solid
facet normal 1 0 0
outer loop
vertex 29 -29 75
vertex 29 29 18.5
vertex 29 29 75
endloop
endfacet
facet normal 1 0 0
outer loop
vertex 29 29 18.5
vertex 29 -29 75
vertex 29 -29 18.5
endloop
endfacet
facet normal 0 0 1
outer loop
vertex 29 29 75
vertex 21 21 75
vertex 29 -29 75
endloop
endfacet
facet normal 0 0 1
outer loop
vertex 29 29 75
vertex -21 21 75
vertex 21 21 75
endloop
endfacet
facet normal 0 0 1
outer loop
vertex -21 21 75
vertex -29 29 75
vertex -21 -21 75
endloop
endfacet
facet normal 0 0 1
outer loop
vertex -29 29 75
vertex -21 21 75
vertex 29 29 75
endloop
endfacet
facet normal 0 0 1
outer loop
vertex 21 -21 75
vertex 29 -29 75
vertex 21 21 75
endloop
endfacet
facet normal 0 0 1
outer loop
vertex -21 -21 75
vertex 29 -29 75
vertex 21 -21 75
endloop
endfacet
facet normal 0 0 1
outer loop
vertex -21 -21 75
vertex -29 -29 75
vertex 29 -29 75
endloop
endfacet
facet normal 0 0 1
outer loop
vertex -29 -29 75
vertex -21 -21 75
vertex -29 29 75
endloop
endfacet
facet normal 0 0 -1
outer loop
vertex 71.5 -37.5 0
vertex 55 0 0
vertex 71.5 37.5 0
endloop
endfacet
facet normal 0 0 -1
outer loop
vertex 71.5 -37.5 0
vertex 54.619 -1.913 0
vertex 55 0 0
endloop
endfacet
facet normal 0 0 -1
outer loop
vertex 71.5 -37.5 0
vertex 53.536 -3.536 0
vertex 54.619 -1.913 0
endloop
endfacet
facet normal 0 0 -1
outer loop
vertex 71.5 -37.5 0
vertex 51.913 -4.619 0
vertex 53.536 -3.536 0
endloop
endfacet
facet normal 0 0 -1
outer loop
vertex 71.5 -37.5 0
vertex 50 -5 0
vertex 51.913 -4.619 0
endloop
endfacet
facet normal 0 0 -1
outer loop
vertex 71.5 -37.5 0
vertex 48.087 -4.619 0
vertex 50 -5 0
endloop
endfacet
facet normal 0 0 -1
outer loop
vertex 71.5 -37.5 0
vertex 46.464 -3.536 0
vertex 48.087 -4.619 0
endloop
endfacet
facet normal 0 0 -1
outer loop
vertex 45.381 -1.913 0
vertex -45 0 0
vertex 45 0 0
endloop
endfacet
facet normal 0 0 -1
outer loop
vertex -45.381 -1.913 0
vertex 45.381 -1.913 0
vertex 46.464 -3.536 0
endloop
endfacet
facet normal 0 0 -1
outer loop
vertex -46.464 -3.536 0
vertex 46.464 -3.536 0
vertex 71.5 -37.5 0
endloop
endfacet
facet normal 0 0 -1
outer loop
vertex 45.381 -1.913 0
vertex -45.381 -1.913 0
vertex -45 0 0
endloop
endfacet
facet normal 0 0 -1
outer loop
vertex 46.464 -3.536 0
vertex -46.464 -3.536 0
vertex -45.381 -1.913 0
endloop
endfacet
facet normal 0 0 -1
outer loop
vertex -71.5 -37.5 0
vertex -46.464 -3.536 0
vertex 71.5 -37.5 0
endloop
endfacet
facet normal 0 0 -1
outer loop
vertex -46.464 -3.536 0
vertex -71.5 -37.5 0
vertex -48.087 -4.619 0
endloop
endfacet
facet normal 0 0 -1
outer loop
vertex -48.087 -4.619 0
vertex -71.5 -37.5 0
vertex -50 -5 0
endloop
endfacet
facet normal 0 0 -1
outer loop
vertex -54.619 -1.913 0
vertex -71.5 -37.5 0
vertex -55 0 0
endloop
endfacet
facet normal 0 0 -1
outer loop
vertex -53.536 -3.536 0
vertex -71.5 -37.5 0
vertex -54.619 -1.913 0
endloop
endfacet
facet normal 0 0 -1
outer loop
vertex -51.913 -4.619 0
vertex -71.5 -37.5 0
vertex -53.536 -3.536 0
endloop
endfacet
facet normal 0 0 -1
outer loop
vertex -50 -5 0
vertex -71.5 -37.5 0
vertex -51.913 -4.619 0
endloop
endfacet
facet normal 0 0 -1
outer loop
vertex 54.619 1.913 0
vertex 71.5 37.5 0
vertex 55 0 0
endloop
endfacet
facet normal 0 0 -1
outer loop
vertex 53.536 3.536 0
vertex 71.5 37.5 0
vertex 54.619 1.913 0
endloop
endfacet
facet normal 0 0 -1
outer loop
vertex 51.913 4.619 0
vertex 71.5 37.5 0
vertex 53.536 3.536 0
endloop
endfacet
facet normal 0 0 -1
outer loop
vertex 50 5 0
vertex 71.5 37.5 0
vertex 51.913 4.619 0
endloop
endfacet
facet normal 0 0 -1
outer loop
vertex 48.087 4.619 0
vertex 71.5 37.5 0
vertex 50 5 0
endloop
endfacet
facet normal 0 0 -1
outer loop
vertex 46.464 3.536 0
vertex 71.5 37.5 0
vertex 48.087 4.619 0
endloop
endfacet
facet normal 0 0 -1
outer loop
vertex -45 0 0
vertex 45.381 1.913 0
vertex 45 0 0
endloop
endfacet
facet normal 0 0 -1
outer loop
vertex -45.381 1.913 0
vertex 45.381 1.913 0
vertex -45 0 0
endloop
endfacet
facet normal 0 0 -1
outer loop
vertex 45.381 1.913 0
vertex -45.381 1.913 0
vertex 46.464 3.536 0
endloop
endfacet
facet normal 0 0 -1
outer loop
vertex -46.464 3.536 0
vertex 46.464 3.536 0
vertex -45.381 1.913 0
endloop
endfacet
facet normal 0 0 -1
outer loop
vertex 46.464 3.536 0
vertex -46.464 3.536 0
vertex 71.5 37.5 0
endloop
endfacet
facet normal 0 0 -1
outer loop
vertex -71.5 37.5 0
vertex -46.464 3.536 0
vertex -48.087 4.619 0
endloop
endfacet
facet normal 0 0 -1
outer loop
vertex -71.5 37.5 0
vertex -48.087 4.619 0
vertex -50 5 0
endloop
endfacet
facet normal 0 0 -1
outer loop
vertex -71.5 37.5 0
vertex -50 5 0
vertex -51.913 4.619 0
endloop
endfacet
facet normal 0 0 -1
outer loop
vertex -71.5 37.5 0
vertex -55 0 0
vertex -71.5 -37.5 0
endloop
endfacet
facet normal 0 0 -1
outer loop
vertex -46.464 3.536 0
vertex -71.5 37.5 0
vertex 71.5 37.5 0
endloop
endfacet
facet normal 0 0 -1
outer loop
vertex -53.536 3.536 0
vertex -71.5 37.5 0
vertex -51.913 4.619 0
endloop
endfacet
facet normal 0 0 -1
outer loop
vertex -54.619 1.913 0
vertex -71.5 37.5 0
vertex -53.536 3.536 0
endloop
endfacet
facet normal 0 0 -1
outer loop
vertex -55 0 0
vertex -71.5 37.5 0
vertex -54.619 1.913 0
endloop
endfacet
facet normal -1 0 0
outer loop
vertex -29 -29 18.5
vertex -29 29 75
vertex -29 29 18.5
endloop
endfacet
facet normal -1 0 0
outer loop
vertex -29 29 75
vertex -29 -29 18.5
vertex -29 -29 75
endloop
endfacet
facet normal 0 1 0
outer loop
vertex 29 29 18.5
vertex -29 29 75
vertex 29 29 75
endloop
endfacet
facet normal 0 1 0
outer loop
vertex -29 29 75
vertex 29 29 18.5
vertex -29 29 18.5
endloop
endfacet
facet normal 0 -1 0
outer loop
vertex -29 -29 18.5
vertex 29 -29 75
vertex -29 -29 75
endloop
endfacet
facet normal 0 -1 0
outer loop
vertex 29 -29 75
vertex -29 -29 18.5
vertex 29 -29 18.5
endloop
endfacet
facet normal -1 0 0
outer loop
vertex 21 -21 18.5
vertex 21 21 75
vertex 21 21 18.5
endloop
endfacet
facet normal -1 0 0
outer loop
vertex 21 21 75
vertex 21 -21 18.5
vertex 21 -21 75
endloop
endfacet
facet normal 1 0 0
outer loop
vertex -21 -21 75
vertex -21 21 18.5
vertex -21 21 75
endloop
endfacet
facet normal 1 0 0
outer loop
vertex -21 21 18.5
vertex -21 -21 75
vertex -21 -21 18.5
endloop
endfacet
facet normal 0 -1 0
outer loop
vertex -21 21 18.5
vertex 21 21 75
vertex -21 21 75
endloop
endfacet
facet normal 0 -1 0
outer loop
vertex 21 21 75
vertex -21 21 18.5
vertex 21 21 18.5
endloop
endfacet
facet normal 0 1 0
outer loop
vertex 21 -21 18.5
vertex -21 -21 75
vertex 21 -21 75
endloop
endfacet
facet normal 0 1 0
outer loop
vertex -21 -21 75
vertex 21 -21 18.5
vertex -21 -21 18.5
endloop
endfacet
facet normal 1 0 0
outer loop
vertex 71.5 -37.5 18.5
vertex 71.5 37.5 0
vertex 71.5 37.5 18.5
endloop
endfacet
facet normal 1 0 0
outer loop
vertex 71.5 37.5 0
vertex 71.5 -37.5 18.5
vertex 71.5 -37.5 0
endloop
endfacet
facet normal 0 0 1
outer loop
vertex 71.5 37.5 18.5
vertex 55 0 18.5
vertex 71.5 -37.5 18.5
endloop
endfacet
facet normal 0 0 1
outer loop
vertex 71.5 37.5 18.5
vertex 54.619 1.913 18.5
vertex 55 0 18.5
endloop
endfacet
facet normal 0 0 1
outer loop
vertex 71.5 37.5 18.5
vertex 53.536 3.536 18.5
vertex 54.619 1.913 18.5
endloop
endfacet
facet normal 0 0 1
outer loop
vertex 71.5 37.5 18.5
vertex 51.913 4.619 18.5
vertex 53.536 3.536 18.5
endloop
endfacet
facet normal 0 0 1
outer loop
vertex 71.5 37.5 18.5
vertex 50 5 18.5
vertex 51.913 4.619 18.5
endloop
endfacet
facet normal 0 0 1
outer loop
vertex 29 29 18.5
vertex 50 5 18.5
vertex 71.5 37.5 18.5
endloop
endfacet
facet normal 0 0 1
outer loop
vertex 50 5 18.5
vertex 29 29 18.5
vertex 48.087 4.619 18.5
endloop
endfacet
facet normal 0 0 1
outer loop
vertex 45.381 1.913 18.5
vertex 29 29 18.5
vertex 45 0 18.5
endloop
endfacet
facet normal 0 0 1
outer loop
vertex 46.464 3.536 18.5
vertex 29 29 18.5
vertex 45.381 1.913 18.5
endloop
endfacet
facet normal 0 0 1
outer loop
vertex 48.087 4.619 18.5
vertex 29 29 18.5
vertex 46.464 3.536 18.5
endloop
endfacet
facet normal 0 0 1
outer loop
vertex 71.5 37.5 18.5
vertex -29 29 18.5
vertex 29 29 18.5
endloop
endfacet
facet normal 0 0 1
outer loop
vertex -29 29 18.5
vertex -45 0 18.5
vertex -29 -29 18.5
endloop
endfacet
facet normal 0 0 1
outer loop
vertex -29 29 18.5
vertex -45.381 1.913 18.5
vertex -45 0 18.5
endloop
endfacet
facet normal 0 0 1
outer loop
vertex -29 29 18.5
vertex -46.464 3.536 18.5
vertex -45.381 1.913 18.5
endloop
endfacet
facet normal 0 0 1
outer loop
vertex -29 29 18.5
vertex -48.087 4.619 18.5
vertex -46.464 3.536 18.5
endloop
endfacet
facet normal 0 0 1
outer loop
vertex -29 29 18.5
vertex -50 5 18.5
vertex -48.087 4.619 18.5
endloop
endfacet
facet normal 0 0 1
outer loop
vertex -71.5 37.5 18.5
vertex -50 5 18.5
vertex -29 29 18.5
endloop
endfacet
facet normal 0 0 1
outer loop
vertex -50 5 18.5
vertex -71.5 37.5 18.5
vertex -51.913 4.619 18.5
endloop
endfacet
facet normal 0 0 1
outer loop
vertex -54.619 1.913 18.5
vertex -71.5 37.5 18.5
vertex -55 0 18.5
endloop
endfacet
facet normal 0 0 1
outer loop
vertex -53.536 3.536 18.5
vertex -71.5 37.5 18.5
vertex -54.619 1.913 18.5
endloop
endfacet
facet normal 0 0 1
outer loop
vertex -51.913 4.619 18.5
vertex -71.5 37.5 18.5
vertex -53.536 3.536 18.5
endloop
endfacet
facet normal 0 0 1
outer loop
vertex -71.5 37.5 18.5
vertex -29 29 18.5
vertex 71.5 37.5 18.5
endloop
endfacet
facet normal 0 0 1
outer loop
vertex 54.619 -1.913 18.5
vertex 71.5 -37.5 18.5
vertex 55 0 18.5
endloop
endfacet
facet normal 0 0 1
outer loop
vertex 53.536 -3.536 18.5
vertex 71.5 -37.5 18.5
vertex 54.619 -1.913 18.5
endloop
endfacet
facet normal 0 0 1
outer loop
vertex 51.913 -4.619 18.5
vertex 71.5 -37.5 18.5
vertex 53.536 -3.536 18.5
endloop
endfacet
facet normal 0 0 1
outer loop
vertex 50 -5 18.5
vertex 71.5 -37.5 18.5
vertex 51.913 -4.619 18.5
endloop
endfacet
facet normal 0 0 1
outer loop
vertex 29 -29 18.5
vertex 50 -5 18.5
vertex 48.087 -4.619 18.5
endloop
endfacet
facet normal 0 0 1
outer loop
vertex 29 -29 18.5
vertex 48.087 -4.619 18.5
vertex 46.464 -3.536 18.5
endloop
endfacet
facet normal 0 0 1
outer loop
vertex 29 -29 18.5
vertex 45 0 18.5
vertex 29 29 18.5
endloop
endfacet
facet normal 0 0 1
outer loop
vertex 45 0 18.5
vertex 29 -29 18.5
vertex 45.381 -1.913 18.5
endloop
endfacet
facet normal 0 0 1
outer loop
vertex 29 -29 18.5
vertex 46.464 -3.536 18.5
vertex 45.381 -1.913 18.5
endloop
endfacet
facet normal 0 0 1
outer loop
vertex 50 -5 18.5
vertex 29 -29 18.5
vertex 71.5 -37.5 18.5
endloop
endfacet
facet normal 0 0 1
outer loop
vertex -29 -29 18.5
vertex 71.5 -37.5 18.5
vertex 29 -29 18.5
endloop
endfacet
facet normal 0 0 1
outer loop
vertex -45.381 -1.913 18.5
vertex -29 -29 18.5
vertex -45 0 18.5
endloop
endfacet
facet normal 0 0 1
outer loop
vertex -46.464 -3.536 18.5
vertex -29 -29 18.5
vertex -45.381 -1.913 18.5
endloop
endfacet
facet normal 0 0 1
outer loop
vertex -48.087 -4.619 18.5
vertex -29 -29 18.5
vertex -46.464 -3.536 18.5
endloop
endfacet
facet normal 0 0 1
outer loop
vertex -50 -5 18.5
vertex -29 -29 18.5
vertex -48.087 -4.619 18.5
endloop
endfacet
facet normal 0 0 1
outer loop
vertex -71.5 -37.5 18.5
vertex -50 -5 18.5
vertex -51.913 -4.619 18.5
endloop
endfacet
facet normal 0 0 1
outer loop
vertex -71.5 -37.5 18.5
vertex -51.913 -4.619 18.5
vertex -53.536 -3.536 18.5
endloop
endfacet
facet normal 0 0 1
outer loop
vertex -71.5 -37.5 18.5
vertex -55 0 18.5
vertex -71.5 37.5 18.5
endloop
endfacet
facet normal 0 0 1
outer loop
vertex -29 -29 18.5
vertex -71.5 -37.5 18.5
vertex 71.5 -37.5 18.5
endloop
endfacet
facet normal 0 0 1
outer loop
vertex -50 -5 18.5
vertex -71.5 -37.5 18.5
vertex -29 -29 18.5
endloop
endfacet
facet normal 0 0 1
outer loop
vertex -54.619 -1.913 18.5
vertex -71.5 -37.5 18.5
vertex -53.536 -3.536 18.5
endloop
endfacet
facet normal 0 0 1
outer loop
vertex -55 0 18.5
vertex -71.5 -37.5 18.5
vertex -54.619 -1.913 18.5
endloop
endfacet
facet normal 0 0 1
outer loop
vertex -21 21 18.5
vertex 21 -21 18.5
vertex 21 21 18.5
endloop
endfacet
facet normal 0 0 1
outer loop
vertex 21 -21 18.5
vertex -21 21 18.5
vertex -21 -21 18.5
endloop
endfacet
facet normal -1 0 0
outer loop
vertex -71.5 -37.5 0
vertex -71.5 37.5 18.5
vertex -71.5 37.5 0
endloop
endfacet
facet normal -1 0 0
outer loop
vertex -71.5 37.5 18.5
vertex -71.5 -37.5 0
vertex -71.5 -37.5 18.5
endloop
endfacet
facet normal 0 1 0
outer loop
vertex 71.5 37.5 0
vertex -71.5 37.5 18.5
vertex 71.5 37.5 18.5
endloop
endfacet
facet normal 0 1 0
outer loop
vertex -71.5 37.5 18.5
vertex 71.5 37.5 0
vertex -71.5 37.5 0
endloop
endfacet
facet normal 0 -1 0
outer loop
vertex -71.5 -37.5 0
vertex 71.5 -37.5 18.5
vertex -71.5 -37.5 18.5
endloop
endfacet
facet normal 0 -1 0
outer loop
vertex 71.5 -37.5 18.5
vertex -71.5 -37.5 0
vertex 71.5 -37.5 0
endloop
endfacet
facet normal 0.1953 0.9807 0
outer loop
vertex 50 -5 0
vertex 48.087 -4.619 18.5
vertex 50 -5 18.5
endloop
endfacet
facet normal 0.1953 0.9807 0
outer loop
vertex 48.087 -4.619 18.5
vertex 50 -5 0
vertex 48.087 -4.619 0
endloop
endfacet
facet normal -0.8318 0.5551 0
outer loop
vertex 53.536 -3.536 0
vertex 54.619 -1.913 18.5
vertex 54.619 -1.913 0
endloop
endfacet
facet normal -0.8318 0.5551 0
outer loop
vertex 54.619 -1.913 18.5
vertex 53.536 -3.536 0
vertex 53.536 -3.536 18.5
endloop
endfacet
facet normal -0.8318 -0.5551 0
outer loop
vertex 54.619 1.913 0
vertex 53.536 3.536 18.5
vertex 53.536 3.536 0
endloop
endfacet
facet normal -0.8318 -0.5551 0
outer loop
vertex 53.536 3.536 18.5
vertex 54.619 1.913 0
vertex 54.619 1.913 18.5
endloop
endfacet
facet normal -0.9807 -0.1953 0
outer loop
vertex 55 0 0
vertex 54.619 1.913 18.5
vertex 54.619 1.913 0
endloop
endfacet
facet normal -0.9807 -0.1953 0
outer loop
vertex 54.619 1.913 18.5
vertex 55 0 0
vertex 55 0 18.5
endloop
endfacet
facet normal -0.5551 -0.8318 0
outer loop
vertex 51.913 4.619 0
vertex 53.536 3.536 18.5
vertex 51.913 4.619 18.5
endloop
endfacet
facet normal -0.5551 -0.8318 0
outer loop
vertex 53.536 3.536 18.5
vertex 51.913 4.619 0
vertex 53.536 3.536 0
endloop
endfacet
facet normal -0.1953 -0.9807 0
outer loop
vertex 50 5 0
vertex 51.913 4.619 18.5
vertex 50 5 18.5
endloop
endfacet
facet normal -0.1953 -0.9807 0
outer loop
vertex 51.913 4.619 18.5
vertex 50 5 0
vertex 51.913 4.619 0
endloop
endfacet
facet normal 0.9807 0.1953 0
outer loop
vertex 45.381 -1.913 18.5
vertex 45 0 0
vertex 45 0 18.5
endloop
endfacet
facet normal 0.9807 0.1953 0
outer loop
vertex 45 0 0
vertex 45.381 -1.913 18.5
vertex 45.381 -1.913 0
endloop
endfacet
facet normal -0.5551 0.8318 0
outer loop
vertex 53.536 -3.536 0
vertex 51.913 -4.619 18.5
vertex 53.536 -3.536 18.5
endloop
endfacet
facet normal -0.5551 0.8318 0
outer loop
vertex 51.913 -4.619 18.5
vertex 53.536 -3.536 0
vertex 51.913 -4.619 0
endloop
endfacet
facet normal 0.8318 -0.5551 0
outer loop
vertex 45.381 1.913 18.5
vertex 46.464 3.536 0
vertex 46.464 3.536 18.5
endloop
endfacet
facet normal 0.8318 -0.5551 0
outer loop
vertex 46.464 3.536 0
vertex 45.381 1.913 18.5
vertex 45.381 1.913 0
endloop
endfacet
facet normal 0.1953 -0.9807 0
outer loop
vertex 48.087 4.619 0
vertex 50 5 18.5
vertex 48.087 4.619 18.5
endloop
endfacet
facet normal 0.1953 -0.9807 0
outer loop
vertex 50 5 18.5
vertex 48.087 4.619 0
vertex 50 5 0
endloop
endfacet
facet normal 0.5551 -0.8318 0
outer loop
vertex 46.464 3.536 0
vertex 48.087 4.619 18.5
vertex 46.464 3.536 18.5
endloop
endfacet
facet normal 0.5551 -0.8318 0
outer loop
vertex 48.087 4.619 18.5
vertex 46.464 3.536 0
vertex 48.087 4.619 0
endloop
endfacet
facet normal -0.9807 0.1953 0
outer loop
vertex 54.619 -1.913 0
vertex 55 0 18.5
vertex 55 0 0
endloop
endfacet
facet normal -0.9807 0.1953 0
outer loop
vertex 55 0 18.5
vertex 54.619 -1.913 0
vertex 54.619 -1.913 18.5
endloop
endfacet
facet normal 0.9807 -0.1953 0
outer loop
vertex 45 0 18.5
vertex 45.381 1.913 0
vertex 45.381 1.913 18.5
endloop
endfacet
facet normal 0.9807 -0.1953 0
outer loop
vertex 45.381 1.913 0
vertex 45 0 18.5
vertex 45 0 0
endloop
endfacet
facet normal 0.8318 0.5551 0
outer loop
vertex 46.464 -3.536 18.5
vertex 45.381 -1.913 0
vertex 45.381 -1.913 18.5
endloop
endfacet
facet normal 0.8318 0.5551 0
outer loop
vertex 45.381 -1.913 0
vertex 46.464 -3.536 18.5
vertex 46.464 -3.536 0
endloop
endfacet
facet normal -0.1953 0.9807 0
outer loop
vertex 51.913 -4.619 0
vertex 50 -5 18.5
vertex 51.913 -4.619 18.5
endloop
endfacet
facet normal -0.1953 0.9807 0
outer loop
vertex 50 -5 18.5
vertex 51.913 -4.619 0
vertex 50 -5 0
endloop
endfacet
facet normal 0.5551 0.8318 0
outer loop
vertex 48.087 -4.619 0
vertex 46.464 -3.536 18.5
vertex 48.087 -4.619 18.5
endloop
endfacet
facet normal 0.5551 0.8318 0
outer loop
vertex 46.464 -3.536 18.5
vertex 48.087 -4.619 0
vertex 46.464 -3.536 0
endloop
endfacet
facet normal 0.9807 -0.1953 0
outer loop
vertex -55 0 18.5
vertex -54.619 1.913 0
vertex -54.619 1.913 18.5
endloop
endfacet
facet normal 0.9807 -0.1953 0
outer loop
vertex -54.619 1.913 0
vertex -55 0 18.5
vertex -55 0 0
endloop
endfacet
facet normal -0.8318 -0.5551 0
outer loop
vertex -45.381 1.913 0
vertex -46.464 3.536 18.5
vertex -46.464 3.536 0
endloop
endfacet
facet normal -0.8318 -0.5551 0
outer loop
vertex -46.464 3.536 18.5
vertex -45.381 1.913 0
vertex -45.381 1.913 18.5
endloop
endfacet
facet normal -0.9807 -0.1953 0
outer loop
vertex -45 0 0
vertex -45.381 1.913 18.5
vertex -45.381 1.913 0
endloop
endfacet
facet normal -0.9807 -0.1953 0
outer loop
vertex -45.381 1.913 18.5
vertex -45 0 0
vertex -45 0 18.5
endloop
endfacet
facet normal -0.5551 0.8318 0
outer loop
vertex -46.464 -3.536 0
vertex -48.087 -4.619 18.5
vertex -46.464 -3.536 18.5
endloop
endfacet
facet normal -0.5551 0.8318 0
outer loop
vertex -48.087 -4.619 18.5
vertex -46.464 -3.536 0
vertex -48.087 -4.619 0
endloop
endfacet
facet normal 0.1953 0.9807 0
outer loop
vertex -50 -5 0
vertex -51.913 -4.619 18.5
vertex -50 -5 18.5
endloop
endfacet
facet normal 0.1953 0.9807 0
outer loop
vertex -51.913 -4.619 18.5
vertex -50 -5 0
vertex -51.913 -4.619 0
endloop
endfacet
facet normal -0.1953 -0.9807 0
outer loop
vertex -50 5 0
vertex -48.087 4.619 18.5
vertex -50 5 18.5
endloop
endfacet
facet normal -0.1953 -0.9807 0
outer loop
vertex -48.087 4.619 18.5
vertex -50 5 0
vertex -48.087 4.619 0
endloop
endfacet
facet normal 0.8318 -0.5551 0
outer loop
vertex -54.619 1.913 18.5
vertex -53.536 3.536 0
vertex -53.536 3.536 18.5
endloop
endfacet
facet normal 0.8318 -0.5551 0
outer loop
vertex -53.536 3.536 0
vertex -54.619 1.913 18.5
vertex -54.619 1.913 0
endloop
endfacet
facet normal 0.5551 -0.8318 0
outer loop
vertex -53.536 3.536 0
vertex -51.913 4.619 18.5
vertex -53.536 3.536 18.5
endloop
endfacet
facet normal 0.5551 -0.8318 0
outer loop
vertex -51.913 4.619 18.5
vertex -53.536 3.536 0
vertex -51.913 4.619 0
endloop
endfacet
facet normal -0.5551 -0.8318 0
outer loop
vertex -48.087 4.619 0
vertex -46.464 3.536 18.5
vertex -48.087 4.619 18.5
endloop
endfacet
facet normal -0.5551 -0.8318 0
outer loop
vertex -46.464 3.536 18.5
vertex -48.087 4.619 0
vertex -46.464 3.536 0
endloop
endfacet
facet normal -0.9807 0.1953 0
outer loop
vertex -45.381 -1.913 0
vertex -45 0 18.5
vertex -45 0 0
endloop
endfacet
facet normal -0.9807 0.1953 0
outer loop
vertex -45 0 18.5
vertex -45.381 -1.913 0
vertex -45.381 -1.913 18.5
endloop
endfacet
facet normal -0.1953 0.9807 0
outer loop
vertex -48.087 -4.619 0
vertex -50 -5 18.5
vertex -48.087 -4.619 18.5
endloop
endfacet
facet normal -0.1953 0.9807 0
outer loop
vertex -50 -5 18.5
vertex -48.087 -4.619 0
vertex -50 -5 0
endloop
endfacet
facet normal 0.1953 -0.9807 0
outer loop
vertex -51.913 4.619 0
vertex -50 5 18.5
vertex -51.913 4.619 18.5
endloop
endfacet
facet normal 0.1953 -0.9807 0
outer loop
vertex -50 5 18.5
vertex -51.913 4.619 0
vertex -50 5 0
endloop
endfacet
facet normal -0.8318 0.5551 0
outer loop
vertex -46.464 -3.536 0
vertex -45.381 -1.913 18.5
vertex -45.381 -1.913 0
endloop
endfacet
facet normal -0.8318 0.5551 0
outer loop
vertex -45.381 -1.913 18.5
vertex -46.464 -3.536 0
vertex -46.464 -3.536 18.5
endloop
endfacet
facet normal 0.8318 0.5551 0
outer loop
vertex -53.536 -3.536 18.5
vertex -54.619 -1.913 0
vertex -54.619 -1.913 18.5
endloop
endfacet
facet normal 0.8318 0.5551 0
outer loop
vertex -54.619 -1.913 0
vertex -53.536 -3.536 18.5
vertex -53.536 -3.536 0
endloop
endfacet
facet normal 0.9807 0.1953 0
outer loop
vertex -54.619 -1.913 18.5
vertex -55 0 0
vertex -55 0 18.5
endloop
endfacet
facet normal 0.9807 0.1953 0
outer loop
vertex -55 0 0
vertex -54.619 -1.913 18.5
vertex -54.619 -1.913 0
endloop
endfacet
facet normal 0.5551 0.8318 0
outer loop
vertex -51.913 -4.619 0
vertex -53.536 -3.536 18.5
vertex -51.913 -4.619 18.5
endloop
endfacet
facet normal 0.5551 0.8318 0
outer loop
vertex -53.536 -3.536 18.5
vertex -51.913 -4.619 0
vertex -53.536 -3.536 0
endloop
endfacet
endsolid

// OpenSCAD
// file: tube_clamp_round_base_plate_132_functions.scad
function get_L_shaft_with_base_plate_round_base_plate_132(tube_diameter) = 
    (tube_diameter == 27) ? 
        85
    : (tube_diameter == 42) ?
        122
    : 25
;
function get_R_plate_round_base_plate_132(tube_diameter) = 
    (tube_diameter == 27) ? 
        [64, 114, 7]
    : (tube_diameter == 42) ?
        [80, 140, 10]
    : [10, 20, 1]
;
function get_offset_hole_y_round_base_plate_132(tube_diameter) = 
    (tube_diameter == 27) ? 
        38
    : (tube_diameter == 42) ?
        50
    : 10
;
function get_diameter_hole_round_base_plate_132(tube_diameter) = 10;
// file: tube_clamp_round_3_way_through_116_functions.scad
function  get_L_shaft_long_round_3_way_through_116(tube_diameter) = 
    (tube_diameter == 27) ? 
        42
    : (tube_diameter == 42) ?
        60
    : 25
;
function get_thickness_round_3_way_through_116(tube_diameter) = 7;
function get_L_shaft_short_round_3_way_through_116(tube_diameter) = tube_diameter + 2 * get_thickness_round_3_way_through_116();
// file: tube_clamp_round_tee_long_104_functions.scad
// include <../../config.scad>;

function get_L_shaft_long_round_tee_long_104(tube_diameter) = 
    (tube_diameter == 27) ? 
        85
    : (tube_diameter == 42) ?
        122
    : 25
;
function get_L_shaft_short_round_tee_long_104(tube_diameter) = 
    (tube_diameter == 27) ? 
        42
    : (tube_diameter == 42) ?
        61
    : 10
;
// file: ../brake/brake_assembly_functions.scad
// include <../../config.scad>; // circular reference!

function get_y_pos_lead_fixing_ballscrew_to_brake_arms(angle_brake_rod, y_pos_axle_rear, x_pos_axle_leg_rear, x_offset_fixing_brake_arm_to_lead_plate) = y_pos_axle_rear - (x_pos_axle_leg_rear - x_offset_fixing_brake_arm_to_lead_plate) / tan(angle_brake_rod); // (X_POS_AXLE_LEG_REAR - X_OFFSET_FIXING_BRAKE_ARM_TO_LEAD_PLATE)
// file: ../common/metric_bolt_functions.scad
function get_metric_bolt_head_height(size) = size;
function get_metric_bolt_head_diameter(size) = size * 2;
function get_metric_bolt_washer_diameter_safe_working_clearance(size) = 
    (size < 20) ?
        4 * size
    :
        3 * size
;
// file: tube_clamp_square_base_plate_132_functions.scad
function get_L_shaft_with_base_plate_square_base_plate_132(beam_width) = 
    // (beam_width == 40) ?
    75
;
function get_R_plate_square_base_plate_132(beam_width) = 
    // (beam_width == 40) ?
    [143, 75, 18.5]
;
function get_thickness_square_base_plate_132(beam_width) = 
    // (beam_width == 40) ?
    8
;
function get_offset_hole_x_square_base_plate_132(beam_width) = 
    // (beam_width == 40) ?
    100 / 2
;
function get_diameter_hole_square_base_plate_132(beam_width) = 
    // (beam_width == 40) ?
    10
;
// main file
include <../../config.scad>;
use <./tube_clamp_square_base_plate_132_functions.scad>;

module tube_clamp_square_base_plate_132(beam_width) {
    L_shaft_with_base_plate = get_L_shaft_with_base_plate_square_base_plate_132(beam_width);
    R_plate = get_R_plate_square_base_plate_132(beam_width);
    t = get_thickness_square_base_plate_132(beam_width);
    offset_hole_x = get_offset_hole_x_square_base_plate_132(beam_width);
    d_hole_bolt_square_base_plate_132 = get_diameter_hole_square_base_plate_132(beam_width);
    color("LightGrey") union() {
        // shaft section
        translate([0, 0, L_shaft_with_base_plate / 2]) difference() {
            cube([beam_width + t * 2, beam_width + t * 2, L_shaft_with_base_plate], center = true);
            cube([beam_width, beam_width, L_shaft_with_base_plate], center = true);
        }
        // base plate
        translate([0, 0, R_plate[2] / 2]) difference() {
            cube(R_plate, center = true);
            translate([offset_hole_x, 0, 0]) cylinder(R_plate[2], d_hole_bolt_square_base_plate_132 / 2, d_hole_bolt_square_base_plate_132 / 2, center = true);
            translate([-offset_hole_x, 0, 0]) cylinder(R_plate[2], d_hole_bolt_square_base_plate_132 / 2, d_hole_bolt_square_base_plate_132 / 2, center = true);
        }
    }
    // Shopping
    echo(str("Square base plate 132: Tube clamp Φ", beam_width, "mm - x1"));
}

// test output
tube_clamp_square_base_plate_132(42);
